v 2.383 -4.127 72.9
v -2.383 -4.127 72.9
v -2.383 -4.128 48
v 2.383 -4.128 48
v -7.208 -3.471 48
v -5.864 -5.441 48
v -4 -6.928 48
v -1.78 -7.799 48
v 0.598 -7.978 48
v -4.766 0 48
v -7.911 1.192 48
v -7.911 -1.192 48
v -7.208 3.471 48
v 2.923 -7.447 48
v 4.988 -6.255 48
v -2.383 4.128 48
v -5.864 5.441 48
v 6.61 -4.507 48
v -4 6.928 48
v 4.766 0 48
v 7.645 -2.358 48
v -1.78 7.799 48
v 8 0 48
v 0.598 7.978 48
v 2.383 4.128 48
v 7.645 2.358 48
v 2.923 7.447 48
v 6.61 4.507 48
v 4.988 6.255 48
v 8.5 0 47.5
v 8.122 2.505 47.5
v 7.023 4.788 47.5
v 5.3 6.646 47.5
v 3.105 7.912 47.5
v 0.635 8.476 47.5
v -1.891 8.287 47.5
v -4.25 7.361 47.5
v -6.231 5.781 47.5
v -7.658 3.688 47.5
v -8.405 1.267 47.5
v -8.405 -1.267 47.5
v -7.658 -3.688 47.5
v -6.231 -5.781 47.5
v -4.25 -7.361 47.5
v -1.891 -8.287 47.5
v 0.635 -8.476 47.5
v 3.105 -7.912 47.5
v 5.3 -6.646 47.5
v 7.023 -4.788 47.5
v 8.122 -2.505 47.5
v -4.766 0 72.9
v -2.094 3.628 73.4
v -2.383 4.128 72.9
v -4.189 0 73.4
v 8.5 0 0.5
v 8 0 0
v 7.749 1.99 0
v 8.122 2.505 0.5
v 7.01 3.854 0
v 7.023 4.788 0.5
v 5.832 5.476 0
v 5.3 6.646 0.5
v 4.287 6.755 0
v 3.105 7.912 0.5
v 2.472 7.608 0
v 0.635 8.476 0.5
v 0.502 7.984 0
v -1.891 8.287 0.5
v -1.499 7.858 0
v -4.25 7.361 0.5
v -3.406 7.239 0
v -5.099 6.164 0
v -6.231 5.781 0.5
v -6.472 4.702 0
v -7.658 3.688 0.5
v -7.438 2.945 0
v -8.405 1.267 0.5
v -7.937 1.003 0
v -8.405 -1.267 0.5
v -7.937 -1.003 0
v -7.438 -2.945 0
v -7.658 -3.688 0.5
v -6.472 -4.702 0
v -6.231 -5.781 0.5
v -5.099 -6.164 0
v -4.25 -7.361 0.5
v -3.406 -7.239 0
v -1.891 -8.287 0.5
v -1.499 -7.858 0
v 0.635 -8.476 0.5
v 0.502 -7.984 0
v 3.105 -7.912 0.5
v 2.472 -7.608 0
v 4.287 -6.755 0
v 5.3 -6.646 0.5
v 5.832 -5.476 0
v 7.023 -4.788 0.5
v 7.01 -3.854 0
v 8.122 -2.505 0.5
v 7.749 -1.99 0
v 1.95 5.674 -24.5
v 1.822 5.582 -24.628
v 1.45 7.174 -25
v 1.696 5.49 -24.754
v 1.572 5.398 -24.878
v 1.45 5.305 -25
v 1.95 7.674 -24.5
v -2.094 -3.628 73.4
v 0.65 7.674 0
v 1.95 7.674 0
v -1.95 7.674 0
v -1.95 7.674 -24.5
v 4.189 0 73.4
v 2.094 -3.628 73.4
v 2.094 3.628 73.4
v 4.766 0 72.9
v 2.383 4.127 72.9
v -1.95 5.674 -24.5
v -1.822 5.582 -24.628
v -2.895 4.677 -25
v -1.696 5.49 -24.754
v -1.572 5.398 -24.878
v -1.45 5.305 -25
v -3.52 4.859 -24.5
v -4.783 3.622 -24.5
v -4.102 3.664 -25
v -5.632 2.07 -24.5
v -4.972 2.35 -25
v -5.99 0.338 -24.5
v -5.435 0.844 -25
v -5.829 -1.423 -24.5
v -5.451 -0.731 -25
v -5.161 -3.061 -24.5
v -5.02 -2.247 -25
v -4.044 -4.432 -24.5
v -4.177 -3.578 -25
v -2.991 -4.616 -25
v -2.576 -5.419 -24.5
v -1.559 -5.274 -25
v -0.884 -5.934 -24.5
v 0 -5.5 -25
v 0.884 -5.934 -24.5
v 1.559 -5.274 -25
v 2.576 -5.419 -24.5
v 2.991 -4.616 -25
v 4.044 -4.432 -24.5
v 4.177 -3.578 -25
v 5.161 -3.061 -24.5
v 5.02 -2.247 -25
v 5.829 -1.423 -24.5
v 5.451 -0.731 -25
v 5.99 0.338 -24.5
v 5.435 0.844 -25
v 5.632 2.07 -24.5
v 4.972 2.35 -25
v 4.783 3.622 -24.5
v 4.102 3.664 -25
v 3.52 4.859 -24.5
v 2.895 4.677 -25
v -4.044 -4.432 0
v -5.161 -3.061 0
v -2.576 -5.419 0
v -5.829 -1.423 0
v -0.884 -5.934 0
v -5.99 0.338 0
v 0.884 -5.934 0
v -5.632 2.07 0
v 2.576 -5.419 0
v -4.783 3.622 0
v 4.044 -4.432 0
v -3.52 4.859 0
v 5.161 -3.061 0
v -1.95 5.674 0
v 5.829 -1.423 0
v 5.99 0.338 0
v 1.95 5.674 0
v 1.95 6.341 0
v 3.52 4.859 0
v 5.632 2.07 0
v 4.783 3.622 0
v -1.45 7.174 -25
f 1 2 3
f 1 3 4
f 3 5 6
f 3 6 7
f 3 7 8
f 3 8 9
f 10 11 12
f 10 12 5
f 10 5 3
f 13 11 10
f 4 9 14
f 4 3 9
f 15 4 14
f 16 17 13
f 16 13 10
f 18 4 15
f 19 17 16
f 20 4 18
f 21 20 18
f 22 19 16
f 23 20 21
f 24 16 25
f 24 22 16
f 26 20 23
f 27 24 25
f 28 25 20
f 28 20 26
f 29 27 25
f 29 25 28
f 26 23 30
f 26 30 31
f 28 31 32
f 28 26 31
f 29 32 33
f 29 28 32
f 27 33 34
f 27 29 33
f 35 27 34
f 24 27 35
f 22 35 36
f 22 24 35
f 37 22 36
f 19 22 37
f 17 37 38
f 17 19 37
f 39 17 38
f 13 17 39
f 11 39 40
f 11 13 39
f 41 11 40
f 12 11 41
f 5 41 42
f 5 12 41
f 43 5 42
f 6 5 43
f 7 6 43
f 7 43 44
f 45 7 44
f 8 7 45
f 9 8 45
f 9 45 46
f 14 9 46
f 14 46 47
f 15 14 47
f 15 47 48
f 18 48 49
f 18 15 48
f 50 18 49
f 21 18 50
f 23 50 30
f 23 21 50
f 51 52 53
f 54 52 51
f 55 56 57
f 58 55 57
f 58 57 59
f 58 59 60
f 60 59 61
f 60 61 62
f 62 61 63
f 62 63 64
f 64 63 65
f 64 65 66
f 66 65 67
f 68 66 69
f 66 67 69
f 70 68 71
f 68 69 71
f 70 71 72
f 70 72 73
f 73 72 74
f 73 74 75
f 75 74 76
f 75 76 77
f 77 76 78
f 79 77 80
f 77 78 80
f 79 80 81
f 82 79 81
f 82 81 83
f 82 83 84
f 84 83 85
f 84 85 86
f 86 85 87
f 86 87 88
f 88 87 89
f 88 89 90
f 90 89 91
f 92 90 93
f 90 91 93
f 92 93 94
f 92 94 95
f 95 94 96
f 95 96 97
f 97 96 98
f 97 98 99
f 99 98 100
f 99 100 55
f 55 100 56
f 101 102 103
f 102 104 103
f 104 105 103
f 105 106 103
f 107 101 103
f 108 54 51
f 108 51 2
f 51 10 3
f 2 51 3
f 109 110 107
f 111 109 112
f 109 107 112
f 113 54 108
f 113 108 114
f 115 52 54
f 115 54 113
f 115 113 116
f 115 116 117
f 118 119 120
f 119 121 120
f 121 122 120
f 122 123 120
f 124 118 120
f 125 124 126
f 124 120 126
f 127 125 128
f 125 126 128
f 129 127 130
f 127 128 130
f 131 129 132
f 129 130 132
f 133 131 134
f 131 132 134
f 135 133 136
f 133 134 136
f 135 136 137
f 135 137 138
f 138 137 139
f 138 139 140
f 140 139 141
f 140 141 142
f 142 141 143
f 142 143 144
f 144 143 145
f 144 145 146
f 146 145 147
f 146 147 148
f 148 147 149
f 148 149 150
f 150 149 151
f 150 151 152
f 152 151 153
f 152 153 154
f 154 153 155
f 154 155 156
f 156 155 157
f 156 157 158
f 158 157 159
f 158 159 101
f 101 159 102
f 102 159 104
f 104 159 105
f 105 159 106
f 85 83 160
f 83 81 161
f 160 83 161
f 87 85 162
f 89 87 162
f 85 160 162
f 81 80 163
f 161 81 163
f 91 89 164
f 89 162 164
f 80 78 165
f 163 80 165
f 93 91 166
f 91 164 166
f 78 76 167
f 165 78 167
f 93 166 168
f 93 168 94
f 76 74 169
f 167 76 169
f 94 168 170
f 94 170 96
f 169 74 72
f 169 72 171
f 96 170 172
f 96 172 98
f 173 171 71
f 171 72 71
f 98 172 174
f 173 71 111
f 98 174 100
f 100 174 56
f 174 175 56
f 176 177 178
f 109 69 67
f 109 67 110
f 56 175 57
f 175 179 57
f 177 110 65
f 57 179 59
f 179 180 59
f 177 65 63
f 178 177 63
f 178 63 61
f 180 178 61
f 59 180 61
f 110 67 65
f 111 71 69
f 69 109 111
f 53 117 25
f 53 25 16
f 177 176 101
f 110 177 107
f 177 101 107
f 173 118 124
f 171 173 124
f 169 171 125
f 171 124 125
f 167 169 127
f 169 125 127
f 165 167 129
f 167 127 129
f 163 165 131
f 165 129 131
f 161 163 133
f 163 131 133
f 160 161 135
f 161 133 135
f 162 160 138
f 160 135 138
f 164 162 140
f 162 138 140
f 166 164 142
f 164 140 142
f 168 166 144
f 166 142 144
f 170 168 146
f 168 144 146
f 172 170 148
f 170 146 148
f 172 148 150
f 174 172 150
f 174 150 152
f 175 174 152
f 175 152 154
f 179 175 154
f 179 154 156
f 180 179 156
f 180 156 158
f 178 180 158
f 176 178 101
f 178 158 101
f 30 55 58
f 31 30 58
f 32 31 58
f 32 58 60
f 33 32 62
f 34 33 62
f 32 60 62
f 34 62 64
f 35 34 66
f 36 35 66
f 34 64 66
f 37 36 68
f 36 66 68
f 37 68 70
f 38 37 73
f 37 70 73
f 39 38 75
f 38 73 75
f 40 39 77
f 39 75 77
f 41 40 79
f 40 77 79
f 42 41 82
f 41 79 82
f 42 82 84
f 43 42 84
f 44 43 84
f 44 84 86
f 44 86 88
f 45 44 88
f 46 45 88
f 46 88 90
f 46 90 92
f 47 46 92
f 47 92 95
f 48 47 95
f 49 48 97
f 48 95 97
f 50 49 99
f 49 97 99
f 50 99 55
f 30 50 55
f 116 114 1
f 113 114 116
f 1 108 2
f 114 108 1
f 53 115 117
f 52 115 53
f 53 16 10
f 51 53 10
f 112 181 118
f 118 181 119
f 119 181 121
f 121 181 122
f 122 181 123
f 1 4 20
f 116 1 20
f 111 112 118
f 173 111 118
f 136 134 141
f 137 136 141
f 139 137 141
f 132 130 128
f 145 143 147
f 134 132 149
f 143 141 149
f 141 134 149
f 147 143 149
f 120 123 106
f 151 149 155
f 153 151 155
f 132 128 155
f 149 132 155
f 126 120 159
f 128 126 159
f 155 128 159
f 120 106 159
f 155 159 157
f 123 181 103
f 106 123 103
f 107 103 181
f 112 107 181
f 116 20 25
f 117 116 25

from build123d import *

# Parameters (mm, degrees)
SKETCH2_R           = 6
BOSS_EXTRUDE1_DEPTH = 25.4
BOSS_EXTRUDE2_START = 25
BOSS_EXTRUDE2_DEPTH = 25
SKETCH4_R           = 8.5
BOSS_EXTRUDE3_DEPTH = 48
BOSS_EXTRUDE4_DEPTH = 25.4
CHAMFER1_SIZE       = 0.5


with BuildPart() as part:
    # Sketch2 → Boss-Extrude1 (new body)
    with BuildSketch(Plane.XY):
        Circle(SKETCH2_R)
    extrude(amount=BOSS_EXTRUDE1_DEPTH)

    # Sketch3 → Boss-Extrude2 (add)
    with BuildSketch(Plane(origin=(0, 0, 0), x_dir=(-1, 0, 0), z_dir=(0, 0, -1)).offset(BOSS_EXTRUDE2_START)):
        with BuildLine():
            Line((-1.95, 5.674284096), (-1.95, 7.674284096))
            Line((-1.95, 7.674284096), (1.95, 7.674284096))
            Line((1.95, 7.674284096), (1.95, 5.674284096))
            ThreePointArc((1.95, 5.674284096), (0, -6), (-1.95, 5.674284096))
        make_face()
    extrude(amount=-BOSS_EXTRUDE2_DEPTH)

    # Sketch4 → Boss-Extrude3 (add)
    with BuildSketch(Plane.XY):
        Circle(SKETCH4_R)
    extrude(amount=BOSS_EXTRUDE3_DEPTH)

    # Sketch5 → Boss-Extrude4 (add)
    with BuildSketch(Plane.XY.offset(48)):
        Polygon((4.766026472, 0), (2.383013236, 4.1275), (-2.383013236, 4.1275), (-4.766026472, 0), (-2.383013236, -4.1275), (2.383013236, -4.1275), align=None)
    extrude(amount=BOSS_EXTRUDE4_DEPTH)

    # Chamfer1
    chamfer1_edges = [part.edges().sort_by_distance(p)[0] for p in [
        (-8.5, 0, 0),
        (-8.5, 0, 48),
        (3.574519854, -2.06375, 73.4),
        (3.574519854, 2.06375, 73.4),
        (0, 4.1275, 73.4),
        (-3.574519854, 2.06375, 73.4),
        (-3.574519854, -2.06375, 73.4),
        (0, -4.1275, 73.4),
        (0, -6, -25),
        (-1.95, 6.674284096, -25),
        (0, 7.674284096, -25),
        (1.95, 6.674284096, -25),
    ]]
    chamfer(chamfer1_edges, length=CHAMFER1_SIZE)


solid = part.part
